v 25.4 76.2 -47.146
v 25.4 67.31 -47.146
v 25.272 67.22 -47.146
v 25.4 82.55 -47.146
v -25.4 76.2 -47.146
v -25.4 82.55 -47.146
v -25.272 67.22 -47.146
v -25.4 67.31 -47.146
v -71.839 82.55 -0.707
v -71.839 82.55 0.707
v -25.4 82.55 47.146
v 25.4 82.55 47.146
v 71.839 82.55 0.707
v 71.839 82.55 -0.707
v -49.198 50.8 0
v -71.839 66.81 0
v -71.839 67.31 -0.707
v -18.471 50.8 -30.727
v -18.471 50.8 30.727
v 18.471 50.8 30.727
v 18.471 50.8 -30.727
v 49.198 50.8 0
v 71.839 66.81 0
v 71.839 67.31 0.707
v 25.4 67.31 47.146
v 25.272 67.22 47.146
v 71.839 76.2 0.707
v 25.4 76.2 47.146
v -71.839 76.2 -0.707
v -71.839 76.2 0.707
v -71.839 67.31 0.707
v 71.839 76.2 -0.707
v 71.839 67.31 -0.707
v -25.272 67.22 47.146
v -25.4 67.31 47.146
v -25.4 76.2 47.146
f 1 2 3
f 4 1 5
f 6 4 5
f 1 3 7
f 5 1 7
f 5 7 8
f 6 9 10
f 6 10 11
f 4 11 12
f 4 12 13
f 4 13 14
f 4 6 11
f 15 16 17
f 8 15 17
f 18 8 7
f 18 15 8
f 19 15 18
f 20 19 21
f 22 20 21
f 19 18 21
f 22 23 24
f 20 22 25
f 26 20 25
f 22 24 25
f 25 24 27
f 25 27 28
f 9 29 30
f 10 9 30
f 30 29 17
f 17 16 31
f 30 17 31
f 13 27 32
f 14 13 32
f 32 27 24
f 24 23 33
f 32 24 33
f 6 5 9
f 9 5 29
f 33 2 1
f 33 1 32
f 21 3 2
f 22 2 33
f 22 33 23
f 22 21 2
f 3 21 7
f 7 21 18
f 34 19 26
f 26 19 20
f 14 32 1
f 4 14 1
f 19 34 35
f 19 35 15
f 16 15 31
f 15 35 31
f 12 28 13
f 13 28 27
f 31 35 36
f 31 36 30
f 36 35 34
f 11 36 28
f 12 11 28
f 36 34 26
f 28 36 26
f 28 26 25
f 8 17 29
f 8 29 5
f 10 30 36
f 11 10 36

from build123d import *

# Parameters (mm, degrees)
BOSS_EXTRUDE1_DEPTH = 76.2
CHAMFER1_SIZE       = 16.51
CHAMFER2_SIZE       = 1
BOSS_EXTRUDE2_DEPTH = 6.35


with BuildPart() as part:
    # Sketch1 → Boss-Extrude1 (new body)
    with BuildSketch(Plane(origin=(0, 0, 0), x_dir=(1, 0, 0), z_dir=(0, 1, 0))):
        Polygon((-25.4, 47.146344636), (25.4, 47.146344636), (72.546344636, 0), (25.4, -47.146344636), (-25.4, -47.146344636), (-72.546344636, 0), align=None)
    extrude(amount=BOSS_EXTRUDE1_DEPTH)

    # SurfaceCut1
    split(bisect_by=Plane(origin=(0, 10.036699622, 10.036699622), x_dir=(-1, 0, 0), z_dir=(0, 0.7071067811865464, 0.7071067811865488)), keep=Keep.TOP)

    # SurfaceCut2
    split(bisect_by=Plane(origin=(0, 10.036699622, -10.036699622), x_dir=(1, 0, 0), z_dir=(0, 0.7071067811865464, -0.7071067811865488)), keep=Keep.TOP)

    # SurfaceCut3
    split(bisect_by=Plane(origin=(0, 50.8, 0), x_dir=(1, 0, 0), z_dir=(0, 1, 0)), keep=Keep.TOP)

    # Chamfer1
    chamfer1_edges = [part.edges().sort_by_distance(p)[0] for p in [
        (-57.183044257, 50.8, 15.363300378),
        (-57.183044257, 50.8, -15.363300378),
        (57.183044257, 50.8, 15.363300378),
        (57.183044257, 50.8, -15.363300378),
    ]]
    chamfer(chamfer1_edges, length=CHAMFER1_SIZE)

    # Chamfer2
    chamfer2_edges = [part.edges().sort_by_distance(p)[0] for p in [
        (72.546344636, 71.755, 0),
        (-72.546344636, 71.755, 0),
    ]]
    chamfer(chamfer2_edges, length=CHAMFER2_SIZE)

    # Sketch10 → Boss-Extrude2 (add)
    with BuildSketch(Plane(origin=(0, 76.2, 0), x_dir=(1, 0, 0), z_dir=(0, 1, 0))):
        Polygon((-25.4, 47.146344636), (-71.839237854, 0.707106781), (-71.839237854, -0.707106781), (-25.4, -47.146344636), (25.4, -47.146344636), (71.839237854, -0.707106781), (71.839237854, 0.707106781), (25.4, 47.146344636), align=None)
    extrude(amount=BOSS_EXTRUDE2_DEPTH)


solid = part.part
